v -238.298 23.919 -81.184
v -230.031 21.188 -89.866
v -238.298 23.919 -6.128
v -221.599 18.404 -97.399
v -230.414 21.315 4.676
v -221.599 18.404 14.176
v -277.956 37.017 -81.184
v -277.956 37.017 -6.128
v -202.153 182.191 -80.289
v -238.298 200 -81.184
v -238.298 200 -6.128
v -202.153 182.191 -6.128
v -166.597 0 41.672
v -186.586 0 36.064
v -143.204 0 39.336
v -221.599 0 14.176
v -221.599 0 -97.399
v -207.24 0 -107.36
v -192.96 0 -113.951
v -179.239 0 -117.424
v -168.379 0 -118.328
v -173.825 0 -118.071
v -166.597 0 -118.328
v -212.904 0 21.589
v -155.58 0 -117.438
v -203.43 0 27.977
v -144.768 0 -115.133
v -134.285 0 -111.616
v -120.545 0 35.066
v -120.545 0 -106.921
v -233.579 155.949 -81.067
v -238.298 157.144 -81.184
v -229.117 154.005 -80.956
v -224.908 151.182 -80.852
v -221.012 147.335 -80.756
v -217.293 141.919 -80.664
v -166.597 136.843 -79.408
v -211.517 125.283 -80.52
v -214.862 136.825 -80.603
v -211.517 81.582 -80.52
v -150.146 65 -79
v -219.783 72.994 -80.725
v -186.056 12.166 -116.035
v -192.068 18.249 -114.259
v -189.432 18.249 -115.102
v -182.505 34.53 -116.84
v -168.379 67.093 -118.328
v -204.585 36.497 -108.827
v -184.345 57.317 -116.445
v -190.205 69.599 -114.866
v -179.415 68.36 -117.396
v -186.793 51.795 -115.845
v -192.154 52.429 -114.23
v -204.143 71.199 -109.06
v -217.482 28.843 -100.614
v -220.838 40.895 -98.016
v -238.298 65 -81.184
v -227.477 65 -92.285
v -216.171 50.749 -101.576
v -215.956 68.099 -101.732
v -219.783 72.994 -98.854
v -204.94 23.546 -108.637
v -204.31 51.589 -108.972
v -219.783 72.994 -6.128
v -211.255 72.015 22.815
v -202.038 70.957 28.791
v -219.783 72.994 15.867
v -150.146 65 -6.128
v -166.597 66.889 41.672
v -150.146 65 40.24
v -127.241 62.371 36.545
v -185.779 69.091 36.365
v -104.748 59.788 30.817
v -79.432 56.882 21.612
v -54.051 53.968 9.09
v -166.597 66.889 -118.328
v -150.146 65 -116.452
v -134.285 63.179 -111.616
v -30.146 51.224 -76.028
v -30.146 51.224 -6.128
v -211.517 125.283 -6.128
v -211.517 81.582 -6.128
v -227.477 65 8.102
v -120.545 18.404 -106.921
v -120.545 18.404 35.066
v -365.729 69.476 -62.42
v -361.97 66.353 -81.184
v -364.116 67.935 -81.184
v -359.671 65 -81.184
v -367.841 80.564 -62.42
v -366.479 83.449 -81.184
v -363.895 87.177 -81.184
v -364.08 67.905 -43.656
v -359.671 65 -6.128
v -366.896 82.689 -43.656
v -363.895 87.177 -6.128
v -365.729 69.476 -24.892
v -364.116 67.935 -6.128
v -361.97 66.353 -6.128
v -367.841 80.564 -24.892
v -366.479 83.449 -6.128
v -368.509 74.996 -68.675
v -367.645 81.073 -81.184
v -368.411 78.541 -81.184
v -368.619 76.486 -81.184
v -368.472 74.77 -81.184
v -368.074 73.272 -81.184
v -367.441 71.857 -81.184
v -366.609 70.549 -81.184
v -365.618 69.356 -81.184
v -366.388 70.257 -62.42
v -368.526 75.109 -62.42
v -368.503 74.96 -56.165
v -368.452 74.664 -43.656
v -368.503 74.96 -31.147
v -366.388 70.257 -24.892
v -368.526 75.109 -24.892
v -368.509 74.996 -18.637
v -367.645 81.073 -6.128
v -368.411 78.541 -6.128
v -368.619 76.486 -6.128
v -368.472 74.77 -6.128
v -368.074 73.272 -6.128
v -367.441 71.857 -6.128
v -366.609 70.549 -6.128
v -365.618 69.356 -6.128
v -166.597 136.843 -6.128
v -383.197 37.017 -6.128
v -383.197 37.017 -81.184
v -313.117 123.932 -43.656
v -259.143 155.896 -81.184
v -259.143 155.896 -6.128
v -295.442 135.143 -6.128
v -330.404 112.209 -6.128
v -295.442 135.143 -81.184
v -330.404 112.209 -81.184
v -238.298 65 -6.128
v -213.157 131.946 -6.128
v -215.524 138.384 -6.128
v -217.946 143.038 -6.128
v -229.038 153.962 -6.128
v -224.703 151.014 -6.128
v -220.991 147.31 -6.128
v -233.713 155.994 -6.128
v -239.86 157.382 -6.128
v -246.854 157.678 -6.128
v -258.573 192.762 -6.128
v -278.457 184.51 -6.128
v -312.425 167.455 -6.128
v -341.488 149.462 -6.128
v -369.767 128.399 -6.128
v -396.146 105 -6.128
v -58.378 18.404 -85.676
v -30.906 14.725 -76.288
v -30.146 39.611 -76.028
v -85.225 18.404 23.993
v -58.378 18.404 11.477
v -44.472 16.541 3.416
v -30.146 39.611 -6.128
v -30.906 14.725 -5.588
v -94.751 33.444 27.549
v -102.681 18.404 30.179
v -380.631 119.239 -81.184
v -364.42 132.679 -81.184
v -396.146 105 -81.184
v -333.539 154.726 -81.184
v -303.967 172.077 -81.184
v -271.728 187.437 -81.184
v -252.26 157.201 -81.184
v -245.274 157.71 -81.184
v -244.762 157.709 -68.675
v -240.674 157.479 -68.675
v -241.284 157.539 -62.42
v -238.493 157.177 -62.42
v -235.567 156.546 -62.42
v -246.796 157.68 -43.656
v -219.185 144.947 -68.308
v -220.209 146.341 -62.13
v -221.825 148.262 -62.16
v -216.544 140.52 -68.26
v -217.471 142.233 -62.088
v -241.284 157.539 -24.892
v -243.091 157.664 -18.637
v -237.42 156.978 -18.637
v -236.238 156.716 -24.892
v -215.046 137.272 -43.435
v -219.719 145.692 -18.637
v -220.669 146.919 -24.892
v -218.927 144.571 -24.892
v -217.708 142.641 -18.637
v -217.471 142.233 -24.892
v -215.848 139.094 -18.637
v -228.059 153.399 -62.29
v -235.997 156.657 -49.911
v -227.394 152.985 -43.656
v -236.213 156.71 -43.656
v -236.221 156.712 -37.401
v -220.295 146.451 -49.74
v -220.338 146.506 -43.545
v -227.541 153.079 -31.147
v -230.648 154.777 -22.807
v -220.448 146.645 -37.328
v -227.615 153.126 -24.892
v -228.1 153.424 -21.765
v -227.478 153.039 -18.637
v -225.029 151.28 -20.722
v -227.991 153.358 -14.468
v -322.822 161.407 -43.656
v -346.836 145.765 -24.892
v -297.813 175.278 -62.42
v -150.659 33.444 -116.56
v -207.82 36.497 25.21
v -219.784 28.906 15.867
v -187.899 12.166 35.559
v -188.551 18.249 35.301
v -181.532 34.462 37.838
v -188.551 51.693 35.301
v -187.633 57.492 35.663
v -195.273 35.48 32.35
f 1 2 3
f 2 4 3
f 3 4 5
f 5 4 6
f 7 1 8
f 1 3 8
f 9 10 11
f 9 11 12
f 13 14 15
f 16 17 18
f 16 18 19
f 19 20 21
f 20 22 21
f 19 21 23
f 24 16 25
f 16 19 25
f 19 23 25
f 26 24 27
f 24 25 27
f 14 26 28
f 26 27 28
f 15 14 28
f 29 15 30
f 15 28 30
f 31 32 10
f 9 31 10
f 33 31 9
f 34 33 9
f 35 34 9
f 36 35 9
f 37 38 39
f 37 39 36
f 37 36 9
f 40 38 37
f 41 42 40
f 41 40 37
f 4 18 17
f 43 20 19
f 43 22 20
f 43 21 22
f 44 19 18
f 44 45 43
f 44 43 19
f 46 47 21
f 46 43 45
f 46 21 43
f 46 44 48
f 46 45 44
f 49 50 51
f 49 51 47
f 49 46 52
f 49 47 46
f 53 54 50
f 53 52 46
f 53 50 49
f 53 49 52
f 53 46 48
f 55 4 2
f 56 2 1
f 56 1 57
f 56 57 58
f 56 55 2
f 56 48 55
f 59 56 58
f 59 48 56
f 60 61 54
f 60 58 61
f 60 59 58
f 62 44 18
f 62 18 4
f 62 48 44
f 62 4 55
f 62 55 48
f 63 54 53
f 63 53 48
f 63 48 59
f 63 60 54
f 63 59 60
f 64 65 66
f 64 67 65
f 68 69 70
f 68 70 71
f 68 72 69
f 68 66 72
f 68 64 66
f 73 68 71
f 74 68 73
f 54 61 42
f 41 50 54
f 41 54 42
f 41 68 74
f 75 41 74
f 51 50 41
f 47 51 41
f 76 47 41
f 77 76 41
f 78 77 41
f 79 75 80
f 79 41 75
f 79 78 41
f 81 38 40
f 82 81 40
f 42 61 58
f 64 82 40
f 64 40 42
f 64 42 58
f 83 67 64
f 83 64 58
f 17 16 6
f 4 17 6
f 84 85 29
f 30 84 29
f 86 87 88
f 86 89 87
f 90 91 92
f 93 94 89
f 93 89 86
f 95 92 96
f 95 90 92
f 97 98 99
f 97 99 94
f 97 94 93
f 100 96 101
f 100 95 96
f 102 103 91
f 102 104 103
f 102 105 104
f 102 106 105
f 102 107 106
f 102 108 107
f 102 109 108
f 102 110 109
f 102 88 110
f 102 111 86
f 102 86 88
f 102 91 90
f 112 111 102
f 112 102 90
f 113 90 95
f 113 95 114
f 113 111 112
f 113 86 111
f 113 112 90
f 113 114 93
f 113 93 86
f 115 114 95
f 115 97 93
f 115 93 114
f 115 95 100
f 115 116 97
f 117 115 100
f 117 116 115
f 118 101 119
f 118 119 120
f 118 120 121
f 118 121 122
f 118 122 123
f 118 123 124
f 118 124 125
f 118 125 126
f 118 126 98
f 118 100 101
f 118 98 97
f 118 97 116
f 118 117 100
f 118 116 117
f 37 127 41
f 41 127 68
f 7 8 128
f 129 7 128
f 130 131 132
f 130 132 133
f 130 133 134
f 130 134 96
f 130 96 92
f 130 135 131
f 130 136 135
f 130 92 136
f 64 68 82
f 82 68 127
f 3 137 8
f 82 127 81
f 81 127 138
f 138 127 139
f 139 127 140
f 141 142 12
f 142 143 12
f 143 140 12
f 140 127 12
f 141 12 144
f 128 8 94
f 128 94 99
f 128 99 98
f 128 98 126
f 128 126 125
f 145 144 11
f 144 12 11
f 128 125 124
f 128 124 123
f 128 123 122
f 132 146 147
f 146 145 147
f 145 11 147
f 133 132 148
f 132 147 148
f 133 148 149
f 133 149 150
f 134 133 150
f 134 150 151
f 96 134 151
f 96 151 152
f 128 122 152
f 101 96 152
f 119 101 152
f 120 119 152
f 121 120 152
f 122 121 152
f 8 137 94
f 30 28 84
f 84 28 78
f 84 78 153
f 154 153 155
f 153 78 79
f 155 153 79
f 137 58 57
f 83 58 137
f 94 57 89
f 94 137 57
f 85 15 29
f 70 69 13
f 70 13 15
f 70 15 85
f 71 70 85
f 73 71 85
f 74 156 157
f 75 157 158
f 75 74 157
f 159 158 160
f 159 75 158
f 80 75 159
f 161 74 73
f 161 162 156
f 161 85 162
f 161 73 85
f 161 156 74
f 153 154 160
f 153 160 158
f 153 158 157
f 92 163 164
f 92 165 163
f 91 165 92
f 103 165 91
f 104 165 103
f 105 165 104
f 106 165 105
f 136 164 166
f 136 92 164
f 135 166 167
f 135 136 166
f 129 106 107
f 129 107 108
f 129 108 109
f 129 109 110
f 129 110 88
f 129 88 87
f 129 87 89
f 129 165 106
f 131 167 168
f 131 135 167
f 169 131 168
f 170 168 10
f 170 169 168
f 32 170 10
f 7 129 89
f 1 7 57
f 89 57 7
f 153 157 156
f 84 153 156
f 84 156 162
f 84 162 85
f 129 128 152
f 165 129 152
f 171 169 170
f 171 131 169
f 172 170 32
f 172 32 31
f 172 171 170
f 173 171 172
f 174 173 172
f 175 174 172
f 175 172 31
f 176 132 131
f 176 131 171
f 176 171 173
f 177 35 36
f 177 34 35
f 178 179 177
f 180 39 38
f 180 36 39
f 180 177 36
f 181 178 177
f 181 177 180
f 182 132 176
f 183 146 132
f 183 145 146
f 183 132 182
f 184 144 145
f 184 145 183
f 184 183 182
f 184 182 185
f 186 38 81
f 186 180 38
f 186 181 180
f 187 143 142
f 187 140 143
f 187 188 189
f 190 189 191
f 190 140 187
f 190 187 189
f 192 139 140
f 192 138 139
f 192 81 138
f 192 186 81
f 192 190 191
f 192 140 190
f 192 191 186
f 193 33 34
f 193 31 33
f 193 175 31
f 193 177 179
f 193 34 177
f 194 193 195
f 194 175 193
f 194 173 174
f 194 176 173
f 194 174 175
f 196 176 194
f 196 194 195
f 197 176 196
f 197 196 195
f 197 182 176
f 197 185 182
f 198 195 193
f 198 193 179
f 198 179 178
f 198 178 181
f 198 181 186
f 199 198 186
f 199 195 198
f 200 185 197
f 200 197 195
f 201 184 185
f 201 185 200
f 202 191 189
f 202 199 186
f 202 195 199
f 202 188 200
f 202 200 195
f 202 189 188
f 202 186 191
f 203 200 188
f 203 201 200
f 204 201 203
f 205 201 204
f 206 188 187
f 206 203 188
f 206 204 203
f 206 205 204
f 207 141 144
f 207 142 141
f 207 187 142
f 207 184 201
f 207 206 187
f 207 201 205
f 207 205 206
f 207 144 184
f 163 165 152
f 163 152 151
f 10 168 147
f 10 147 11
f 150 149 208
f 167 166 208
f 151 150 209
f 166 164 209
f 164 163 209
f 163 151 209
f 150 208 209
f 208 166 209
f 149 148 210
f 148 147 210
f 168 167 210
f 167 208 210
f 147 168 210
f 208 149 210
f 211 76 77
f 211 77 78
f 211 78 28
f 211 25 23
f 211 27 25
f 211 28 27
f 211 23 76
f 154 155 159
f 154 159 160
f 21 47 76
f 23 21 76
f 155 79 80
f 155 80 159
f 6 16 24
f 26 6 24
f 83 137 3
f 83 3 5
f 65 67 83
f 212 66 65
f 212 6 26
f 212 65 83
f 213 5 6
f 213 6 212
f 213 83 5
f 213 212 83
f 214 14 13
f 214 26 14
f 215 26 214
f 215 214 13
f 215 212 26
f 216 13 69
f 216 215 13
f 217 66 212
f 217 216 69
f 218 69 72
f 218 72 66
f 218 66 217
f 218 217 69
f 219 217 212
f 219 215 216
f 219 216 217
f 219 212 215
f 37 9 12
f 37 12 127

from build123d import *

# Parameters (mm, degrees)
SKETCH1_W                       = 800
SKETCH1_H                       = 160
BOSS_EXTRUDE1_DEPTH             = 200
SKETCH2_OUTSIDE_W               = 970
SKETCH2_OUTSIDE_H               = 370
CUT_EXTRUDE1_DEPTH              = 210
CUT_EXTRUDE2_DEPTH              = 210
CUT_EXTRUDE3_DEPTH              = 210
CUT_EXTRUDE14_DEPTH             = 180.8
CUT_EXTRUDE16_DEPTH             = 180.8
CUT_EXTRUDE16_DEPTH_BACK        = 190.8
CUT_EXTRUDE17_DEPTH             = 180.8
CUT_EXTRUDE17_DEPTH_BACK        = 200.8
CUT_EXTRUDE18_REACH             = 184.191
CUT_EXTRUDE18_DIRECTION_2_DEPTH = 200.8


with BuildPart() as part:
    # Sketch1 → Boss-Extrude1 (new body)
    with BuildSketch(Plane(origin=(0, 0, 0), x_dir=(1, 0, 0), z_dir=(0, 1, 0))):
        with Locations((3.854228083, 38.328115975)):
            Rectangle(SKETCH1_W, SKETCH1_H)
    extrude(amount=BOSS_EXTRUDE1_DEPTH)

    # Sketch2 outside → Cut-Extrude1 (cut)
    with BuildSketch(Plane.XY.offset(41.671884025)):
        with Locations((3.854, 100)):
            Rectangle(SKETCH2_OUTSIDE_W, SKETCH2_OUTSIDE_H)
        with BuildLine():
            Line((-376.145771917, 0), (-396.145771917, 105))
            add(Edge.make_bspline(
                [(-396.145771917, 105), (-328.42203974, 170.31399873), (-238.298025694, 200)],
                knots=[0, 0, 0, 1, 1, 1], degree=2))
            Line((-238.298025694, 200), (-202.15321923, 182.191355743))
            Line((-202.15321923, 182.191355743), (-166.597046862, 136.842847328))
            Line((-166.597046862, 136.842847328), (-150.145771917, 65))
            Line((-150.145771917, 65), (-30.145771917, 51.22406477))
            Line((-30.145771917, 51.22406477), (403.854228083, 25.4))
            Line((403.854228083, 25.4), (403.854228083, 0))
            Line((403.854228083, 0), (-376.145771917, 0))
        make_face(mode=Mode.SUBTRACT)
        with BuildLine():
            Line((-211.516960473, 125.283414587), (-211.516960473, 81.582332534))
            Line((-211.516960473, 81.582332534), (-227.477293515, 65))
            Line((-227.477293515, 65), (-359.671028655, 65))
            add(Edge.make_bspline(
                [(-359.671028655, 65), (-375.120725506, 73.239634223), (-363.895142009, 87.176595106)],
                knots=[0, 0, 0, 1, 1, 1], degree=2))
            add(Edge.make_bspline(
                [(-363.895142009, 87.176595106), (-314.715420644, 126.327972018), (-259.142586364, 155.895579394)],
                knots=[0, 0, 0, 1, 1, 1], degree=2))
            add(Edge.make_bspline(
                [(-259.142586364, 155.895579394), (-219.458098431, 165.381218899), (-211.516960473, 125.283414587)],
                knots=[0, 0, 0, 1, 1, 1], degree=2))
        make_face()
    extrude(amount=-CUT_EXTRUDE1_DEPTH, mode=Mode.SUBTRACT)

    # Sketch4 → Cut-Extrude2 (cut)
    with BuildSketch(Plane.XY.offset(41.671884025)):
        Polygon((-277.956260832, 37.01669692), (-383.196571331, 37.01669692), (-376.145771917, 0), (-221.599064851, 0), (-221.599064851, 18.403654878), align=None)
        Polygon((-120.544782401, 18.403654878), (-120.544782401, 0), (-30.906390802, 0), (-30.906390802, 14.724864973), (-58.3780519, 18.403654878), align=None)
    extrude(amount=-CUT_EXTRUDE2_DEPTH, mode=Mode.SUBTRACT)

    # Sketch5 → Cut-Extrude3 (cut)
    with BuildSketch(Plane.XY.offset(41.671884025)):
        Polygon((-30.906390802, 14.724864973), (403.854228083, 0), (-30.906390802, 0), align=None)
    extrude(amount=-CUT_EXTRUDE3_DEPTH, mode=Mode.SUBTRACT)

    # Sketch18 → Cut-Extrude14 (cut)
    with BuildSketch(Plane.XY.offset(41.671884025)):
        Polygon((-30.145771917, 39.610669398), (-30.906390802, 14.724864973), (428.920649615, -48.757692213), (545.595043402, 67.916701575), (-30.145771917, 67.916701575), align=None)
    extrude(amount=-CUT_EXTRUDE14_DEPTH, mode=Mode.SUBTRACT)

    # Sketch19 → Cut-Extrude16 (cut, two sides)
    with BuildSketch(Plane(origin=(0, 182.191355743, 0), x_dir=(1, 0, 0), z_dir=(0, 1, 0))) as cut_extrude16_sk:
        with BuildLine():
            add(Edge.make_bspline(
                [(-238.298025694, 6.128115975), (-213.192031563, -32.648304069), (-166.597046862, -41.671884025)],
                knots=[0, 0, 0, 1, 1, 1], degree=2))
            Line((-238.298025694, 6.128115975), (-396.145771917, 6.128115975))
            Line((-396.145771917, 6.128115975), (-396.145771917, -41.671884025))
            Line((-396.145771917, -41.671884025), (-166.597046862, -41.671884025))
        make_face()
        with BuildLine():
            Line((-30.145771917, -41.671884025), (-30.145771917, 6.128115975))
            add(Edge.make_bspline(
                [(-166.597046862, -41.671884025), (-91.130359602, -37.325806898), (-30.145771917, 6.128115975)],
                knots=[0, 0, 0, 1, 1, 1], degree=2))
            Line((-166.597046862, -41.671884025), (-30.145771917, -41.671884025))
        make_face()
    extrude(amount=CUT_EXTRUDE16_DEPTH, mode=Mode.SUBTRACT)
    extrude(cut_extrude16_sk.sketch, amount=-CUT_EXTRUDE16_DEPTH_BACK, mode=Mode.SUBTRACT)

    # Sketch20 → Cut-Extrude17 (cut, two sides)
    with BuildSketch(Plane(origin=(0, 182.191355743, 0), x_dir=(1, 0, 0), z_dir=(0, 1, 0))) as cut_extrude17_sk:
        with BuildLine():
            Line((-396.145771917, 81.183828909), (-238.298025694, 81.183828909))
            add(Edge.make_bspline(
                [(-168.378508208, 118.328115975), (-205.831679422, 117.897349331), (-238.298025694, 81.183828909)],
                knots=[0.306582709, 0.306582709, 0.306582709, 1, 1, 1], degree=2))
            Line((-168.378508208, 118.328115975), (-396.145771917, 118.328115975))
            Line((-396.145771917, 118.328115975), (-396.145771917, 81.183828909))
        make_face()
        with BuildLine():
            Line((-134.285105115, 111.616416024), (-30.145771917, 76.028115975))
            Line((-30.145771917, 76.028115975), (-30.145771917, 118.328115975))
            Line((-30.145771917, 118.328115975), (-166.597046862, 118.328115975))
            add(Edge.make_bspline(
                [(-134.285105115, 111.616416024), (-150.877544313, 118.147888346), (-166.597046862, 118.328115975)],
                knots=[0, 0, 0, 0.290117528, 0.290117528, 0.290117528], degree=2))
        make_face()
    extrude(amount=CUT_EXTRUDE17_DEPTH, mode=Mode.SUBTRACT)
    extrude(cut_extrude17_sk.sketch, amount=-CUT_EXTRUDE17_DEPTH_BACK, mode=Mode.SUBTRACT)

    # Cut-Extrude18: up to this face of the body (flat: up to its plane)
    cut_extrude18_end = Plane(part.part.faces().sort_by_distance((-97.398178535, 58.94460475, -36.613004679))[0])
    # Sketch21 → Cut-Extrude18 (cut, up to the picked face)
    with BuildSketch(Plane(origin=(0, 182.191355743, 0), x_dir=(1, 0, 0), z_dir=(0, 1, 0)), mode=Mode.PRIVATE) as cut_extrude18_sk1:
        Polygon((-238.298025694, 81.183828909), (-30.145771917, 76.028115975), (-30.145771917, 124.841771597), (-244.744601957, 124.841771597), align=None)
    cut_extrude18_tool1 = split(extrude(cut_extrude18_sk1.sketch, amount=-CUT_EXTRUDE18_REACH, mode=Mode.PRIVATE), bisect_by=cut_extrude18_end, keep=Keep.BOTH, mode=Mode.PRIVATE)
    add(cut_extrude18_tool1.solids().sort_by_distance((-133.846358, 182.191356, -101.823698))[0], mode=Mode.SUBTRACT)
    # Sketch21 → Cut-Extrude18 (cut, up to the picked face)
    with BuildSketch(Plane(origin=(0, 182.191355743, 0), x_dir=(1, 0, 0), z_dir=(0, 1, 0)), mode=Mode.PRIVATE) as cut_extrude18_sk2:
        Polygon((-238.298025694, 6.128115975), (-30.145771917, 6.128115975), (-30.145771917, -32.297232434), (-30.145771917, -55.493942553), (-238.298025694, -55.493942553), align=None)
    cut_extrude18_tool2 = split(extrude(cut_extrude18_sk2.sketch, amount=-CUT_EXTRUDE18_REACH, mode=Mode.PRIVATE), bisect_by=cut_extrude18_end, keep=Keep.BOTH, mode=Mode.PRIVATE)
    add(cut_extrude18_tool2.solids().sort_by_distance((-134.221899, 182.191356, 24.682913))[0], mode=Mode.SUBTRACT)

    # Sketch21 → Cut-Extrude18 direction 2 (cut)
    with BuildSketch(Plane(origin=(0, 182.191355743, 0), x_dir=(1, 0, 0), z_dir=(0, 1, 0))):
        Polygon((-238.298025694, 81.183828909), (-30.145771917, 76.028115975), (-30.145771917, 124.841771597), (-244.744601957, 124.841771597), align=None)
        Polygon((-238.298025694, 6.128115975), (-30.145771917, 6.128115975), (-30.145771917, -32.297232434), (-30.145771917, -55.493942553), (-238.298025694, -55.493942553), align=None)
    extrude(amount=CUT_EXTRUDE18_DIRECTION_2_DEPTH, mode=Mode.SUBTRACT)


solid = part.part
